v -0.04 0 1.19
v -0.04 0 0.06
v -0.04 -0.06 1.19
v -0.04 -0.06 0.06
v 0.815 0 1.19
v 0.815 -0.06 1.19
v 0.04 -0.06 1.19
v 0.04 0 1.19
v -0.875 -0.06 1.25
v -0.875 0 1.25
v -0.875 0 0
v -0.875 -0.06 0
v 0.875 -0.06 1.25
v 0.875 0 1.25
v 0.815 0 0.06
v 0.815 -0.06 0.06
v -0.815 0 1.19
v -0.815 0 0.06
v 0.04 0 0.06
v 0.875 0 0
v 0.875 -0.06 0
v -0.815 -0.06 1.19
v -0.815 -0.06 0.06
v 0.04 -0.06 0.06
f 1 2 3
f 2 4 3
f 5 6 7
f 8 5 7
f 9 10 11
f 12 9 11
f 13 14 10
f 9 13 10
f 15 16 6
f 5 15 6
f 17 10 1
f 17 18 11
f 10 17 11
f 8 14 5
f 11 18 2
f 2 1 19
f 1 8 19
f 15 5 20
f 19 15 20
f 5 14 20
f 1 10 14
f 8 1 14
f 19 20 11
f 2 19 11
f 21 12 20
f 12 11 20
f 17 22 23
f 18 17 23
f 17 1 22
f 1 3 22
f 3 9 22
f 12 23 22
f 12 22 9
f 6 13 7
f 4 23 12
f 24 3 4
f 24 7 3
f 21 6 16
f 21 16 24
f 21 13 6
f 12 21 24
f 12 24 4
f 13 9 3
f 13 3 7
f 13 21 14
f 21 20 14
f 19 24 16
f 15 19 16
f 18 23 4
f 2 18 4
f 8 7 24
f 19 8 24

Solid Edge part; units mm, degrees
sketch "Sketch1" plane through (0, 0, 0) normal (0, -1, 0) x (1, 0, 0)
  line L0 (-0.875, 0) -> (0.875, 0)
  line L1 (0.875, 0) -> (0.875, 1.25)
  line L2 (0.875, 1.25) -> (-0.875, 1.25)
  line L3 (-0.875, 1.25) -> (-0.875, 0)
  dimension "D1" = 1.25
  dimension "D2" = 1.75
extrude "Protrusion1" add sketch "Sketch1" along normal blind 0.06
sketch "Sketch2" plane through (0, -0.06, 0.75) normal (0, -1, 0) x (1, 0, 0)
  line L0 (0.04, -0.69) -> (0.815, -0.69)
  line L1 (0.815, -0.69) -> (0.815, 0.44)
  line L2 (0.815, 0.44) -> (0.04, 0.44)
  line L3 (0.04, 0.44) -> (0.04, -0.69)
  line L4 (-0.815, -0.69) -> (-0.04, -0.69)
  line L5 (-0.04, -0.69) -> (-0.04, 0.44)
  line L6 (-0.04, 0.44) -> (-0.815, 0.44)
  line L7 (-0.815, 0.44) -> (-0.815, -0.69)
  dimension "D1" = 0.06
  dimension "D2" = 0.08
extrude "Cutout1" cut sketch "Sketch2" against normal up to next
